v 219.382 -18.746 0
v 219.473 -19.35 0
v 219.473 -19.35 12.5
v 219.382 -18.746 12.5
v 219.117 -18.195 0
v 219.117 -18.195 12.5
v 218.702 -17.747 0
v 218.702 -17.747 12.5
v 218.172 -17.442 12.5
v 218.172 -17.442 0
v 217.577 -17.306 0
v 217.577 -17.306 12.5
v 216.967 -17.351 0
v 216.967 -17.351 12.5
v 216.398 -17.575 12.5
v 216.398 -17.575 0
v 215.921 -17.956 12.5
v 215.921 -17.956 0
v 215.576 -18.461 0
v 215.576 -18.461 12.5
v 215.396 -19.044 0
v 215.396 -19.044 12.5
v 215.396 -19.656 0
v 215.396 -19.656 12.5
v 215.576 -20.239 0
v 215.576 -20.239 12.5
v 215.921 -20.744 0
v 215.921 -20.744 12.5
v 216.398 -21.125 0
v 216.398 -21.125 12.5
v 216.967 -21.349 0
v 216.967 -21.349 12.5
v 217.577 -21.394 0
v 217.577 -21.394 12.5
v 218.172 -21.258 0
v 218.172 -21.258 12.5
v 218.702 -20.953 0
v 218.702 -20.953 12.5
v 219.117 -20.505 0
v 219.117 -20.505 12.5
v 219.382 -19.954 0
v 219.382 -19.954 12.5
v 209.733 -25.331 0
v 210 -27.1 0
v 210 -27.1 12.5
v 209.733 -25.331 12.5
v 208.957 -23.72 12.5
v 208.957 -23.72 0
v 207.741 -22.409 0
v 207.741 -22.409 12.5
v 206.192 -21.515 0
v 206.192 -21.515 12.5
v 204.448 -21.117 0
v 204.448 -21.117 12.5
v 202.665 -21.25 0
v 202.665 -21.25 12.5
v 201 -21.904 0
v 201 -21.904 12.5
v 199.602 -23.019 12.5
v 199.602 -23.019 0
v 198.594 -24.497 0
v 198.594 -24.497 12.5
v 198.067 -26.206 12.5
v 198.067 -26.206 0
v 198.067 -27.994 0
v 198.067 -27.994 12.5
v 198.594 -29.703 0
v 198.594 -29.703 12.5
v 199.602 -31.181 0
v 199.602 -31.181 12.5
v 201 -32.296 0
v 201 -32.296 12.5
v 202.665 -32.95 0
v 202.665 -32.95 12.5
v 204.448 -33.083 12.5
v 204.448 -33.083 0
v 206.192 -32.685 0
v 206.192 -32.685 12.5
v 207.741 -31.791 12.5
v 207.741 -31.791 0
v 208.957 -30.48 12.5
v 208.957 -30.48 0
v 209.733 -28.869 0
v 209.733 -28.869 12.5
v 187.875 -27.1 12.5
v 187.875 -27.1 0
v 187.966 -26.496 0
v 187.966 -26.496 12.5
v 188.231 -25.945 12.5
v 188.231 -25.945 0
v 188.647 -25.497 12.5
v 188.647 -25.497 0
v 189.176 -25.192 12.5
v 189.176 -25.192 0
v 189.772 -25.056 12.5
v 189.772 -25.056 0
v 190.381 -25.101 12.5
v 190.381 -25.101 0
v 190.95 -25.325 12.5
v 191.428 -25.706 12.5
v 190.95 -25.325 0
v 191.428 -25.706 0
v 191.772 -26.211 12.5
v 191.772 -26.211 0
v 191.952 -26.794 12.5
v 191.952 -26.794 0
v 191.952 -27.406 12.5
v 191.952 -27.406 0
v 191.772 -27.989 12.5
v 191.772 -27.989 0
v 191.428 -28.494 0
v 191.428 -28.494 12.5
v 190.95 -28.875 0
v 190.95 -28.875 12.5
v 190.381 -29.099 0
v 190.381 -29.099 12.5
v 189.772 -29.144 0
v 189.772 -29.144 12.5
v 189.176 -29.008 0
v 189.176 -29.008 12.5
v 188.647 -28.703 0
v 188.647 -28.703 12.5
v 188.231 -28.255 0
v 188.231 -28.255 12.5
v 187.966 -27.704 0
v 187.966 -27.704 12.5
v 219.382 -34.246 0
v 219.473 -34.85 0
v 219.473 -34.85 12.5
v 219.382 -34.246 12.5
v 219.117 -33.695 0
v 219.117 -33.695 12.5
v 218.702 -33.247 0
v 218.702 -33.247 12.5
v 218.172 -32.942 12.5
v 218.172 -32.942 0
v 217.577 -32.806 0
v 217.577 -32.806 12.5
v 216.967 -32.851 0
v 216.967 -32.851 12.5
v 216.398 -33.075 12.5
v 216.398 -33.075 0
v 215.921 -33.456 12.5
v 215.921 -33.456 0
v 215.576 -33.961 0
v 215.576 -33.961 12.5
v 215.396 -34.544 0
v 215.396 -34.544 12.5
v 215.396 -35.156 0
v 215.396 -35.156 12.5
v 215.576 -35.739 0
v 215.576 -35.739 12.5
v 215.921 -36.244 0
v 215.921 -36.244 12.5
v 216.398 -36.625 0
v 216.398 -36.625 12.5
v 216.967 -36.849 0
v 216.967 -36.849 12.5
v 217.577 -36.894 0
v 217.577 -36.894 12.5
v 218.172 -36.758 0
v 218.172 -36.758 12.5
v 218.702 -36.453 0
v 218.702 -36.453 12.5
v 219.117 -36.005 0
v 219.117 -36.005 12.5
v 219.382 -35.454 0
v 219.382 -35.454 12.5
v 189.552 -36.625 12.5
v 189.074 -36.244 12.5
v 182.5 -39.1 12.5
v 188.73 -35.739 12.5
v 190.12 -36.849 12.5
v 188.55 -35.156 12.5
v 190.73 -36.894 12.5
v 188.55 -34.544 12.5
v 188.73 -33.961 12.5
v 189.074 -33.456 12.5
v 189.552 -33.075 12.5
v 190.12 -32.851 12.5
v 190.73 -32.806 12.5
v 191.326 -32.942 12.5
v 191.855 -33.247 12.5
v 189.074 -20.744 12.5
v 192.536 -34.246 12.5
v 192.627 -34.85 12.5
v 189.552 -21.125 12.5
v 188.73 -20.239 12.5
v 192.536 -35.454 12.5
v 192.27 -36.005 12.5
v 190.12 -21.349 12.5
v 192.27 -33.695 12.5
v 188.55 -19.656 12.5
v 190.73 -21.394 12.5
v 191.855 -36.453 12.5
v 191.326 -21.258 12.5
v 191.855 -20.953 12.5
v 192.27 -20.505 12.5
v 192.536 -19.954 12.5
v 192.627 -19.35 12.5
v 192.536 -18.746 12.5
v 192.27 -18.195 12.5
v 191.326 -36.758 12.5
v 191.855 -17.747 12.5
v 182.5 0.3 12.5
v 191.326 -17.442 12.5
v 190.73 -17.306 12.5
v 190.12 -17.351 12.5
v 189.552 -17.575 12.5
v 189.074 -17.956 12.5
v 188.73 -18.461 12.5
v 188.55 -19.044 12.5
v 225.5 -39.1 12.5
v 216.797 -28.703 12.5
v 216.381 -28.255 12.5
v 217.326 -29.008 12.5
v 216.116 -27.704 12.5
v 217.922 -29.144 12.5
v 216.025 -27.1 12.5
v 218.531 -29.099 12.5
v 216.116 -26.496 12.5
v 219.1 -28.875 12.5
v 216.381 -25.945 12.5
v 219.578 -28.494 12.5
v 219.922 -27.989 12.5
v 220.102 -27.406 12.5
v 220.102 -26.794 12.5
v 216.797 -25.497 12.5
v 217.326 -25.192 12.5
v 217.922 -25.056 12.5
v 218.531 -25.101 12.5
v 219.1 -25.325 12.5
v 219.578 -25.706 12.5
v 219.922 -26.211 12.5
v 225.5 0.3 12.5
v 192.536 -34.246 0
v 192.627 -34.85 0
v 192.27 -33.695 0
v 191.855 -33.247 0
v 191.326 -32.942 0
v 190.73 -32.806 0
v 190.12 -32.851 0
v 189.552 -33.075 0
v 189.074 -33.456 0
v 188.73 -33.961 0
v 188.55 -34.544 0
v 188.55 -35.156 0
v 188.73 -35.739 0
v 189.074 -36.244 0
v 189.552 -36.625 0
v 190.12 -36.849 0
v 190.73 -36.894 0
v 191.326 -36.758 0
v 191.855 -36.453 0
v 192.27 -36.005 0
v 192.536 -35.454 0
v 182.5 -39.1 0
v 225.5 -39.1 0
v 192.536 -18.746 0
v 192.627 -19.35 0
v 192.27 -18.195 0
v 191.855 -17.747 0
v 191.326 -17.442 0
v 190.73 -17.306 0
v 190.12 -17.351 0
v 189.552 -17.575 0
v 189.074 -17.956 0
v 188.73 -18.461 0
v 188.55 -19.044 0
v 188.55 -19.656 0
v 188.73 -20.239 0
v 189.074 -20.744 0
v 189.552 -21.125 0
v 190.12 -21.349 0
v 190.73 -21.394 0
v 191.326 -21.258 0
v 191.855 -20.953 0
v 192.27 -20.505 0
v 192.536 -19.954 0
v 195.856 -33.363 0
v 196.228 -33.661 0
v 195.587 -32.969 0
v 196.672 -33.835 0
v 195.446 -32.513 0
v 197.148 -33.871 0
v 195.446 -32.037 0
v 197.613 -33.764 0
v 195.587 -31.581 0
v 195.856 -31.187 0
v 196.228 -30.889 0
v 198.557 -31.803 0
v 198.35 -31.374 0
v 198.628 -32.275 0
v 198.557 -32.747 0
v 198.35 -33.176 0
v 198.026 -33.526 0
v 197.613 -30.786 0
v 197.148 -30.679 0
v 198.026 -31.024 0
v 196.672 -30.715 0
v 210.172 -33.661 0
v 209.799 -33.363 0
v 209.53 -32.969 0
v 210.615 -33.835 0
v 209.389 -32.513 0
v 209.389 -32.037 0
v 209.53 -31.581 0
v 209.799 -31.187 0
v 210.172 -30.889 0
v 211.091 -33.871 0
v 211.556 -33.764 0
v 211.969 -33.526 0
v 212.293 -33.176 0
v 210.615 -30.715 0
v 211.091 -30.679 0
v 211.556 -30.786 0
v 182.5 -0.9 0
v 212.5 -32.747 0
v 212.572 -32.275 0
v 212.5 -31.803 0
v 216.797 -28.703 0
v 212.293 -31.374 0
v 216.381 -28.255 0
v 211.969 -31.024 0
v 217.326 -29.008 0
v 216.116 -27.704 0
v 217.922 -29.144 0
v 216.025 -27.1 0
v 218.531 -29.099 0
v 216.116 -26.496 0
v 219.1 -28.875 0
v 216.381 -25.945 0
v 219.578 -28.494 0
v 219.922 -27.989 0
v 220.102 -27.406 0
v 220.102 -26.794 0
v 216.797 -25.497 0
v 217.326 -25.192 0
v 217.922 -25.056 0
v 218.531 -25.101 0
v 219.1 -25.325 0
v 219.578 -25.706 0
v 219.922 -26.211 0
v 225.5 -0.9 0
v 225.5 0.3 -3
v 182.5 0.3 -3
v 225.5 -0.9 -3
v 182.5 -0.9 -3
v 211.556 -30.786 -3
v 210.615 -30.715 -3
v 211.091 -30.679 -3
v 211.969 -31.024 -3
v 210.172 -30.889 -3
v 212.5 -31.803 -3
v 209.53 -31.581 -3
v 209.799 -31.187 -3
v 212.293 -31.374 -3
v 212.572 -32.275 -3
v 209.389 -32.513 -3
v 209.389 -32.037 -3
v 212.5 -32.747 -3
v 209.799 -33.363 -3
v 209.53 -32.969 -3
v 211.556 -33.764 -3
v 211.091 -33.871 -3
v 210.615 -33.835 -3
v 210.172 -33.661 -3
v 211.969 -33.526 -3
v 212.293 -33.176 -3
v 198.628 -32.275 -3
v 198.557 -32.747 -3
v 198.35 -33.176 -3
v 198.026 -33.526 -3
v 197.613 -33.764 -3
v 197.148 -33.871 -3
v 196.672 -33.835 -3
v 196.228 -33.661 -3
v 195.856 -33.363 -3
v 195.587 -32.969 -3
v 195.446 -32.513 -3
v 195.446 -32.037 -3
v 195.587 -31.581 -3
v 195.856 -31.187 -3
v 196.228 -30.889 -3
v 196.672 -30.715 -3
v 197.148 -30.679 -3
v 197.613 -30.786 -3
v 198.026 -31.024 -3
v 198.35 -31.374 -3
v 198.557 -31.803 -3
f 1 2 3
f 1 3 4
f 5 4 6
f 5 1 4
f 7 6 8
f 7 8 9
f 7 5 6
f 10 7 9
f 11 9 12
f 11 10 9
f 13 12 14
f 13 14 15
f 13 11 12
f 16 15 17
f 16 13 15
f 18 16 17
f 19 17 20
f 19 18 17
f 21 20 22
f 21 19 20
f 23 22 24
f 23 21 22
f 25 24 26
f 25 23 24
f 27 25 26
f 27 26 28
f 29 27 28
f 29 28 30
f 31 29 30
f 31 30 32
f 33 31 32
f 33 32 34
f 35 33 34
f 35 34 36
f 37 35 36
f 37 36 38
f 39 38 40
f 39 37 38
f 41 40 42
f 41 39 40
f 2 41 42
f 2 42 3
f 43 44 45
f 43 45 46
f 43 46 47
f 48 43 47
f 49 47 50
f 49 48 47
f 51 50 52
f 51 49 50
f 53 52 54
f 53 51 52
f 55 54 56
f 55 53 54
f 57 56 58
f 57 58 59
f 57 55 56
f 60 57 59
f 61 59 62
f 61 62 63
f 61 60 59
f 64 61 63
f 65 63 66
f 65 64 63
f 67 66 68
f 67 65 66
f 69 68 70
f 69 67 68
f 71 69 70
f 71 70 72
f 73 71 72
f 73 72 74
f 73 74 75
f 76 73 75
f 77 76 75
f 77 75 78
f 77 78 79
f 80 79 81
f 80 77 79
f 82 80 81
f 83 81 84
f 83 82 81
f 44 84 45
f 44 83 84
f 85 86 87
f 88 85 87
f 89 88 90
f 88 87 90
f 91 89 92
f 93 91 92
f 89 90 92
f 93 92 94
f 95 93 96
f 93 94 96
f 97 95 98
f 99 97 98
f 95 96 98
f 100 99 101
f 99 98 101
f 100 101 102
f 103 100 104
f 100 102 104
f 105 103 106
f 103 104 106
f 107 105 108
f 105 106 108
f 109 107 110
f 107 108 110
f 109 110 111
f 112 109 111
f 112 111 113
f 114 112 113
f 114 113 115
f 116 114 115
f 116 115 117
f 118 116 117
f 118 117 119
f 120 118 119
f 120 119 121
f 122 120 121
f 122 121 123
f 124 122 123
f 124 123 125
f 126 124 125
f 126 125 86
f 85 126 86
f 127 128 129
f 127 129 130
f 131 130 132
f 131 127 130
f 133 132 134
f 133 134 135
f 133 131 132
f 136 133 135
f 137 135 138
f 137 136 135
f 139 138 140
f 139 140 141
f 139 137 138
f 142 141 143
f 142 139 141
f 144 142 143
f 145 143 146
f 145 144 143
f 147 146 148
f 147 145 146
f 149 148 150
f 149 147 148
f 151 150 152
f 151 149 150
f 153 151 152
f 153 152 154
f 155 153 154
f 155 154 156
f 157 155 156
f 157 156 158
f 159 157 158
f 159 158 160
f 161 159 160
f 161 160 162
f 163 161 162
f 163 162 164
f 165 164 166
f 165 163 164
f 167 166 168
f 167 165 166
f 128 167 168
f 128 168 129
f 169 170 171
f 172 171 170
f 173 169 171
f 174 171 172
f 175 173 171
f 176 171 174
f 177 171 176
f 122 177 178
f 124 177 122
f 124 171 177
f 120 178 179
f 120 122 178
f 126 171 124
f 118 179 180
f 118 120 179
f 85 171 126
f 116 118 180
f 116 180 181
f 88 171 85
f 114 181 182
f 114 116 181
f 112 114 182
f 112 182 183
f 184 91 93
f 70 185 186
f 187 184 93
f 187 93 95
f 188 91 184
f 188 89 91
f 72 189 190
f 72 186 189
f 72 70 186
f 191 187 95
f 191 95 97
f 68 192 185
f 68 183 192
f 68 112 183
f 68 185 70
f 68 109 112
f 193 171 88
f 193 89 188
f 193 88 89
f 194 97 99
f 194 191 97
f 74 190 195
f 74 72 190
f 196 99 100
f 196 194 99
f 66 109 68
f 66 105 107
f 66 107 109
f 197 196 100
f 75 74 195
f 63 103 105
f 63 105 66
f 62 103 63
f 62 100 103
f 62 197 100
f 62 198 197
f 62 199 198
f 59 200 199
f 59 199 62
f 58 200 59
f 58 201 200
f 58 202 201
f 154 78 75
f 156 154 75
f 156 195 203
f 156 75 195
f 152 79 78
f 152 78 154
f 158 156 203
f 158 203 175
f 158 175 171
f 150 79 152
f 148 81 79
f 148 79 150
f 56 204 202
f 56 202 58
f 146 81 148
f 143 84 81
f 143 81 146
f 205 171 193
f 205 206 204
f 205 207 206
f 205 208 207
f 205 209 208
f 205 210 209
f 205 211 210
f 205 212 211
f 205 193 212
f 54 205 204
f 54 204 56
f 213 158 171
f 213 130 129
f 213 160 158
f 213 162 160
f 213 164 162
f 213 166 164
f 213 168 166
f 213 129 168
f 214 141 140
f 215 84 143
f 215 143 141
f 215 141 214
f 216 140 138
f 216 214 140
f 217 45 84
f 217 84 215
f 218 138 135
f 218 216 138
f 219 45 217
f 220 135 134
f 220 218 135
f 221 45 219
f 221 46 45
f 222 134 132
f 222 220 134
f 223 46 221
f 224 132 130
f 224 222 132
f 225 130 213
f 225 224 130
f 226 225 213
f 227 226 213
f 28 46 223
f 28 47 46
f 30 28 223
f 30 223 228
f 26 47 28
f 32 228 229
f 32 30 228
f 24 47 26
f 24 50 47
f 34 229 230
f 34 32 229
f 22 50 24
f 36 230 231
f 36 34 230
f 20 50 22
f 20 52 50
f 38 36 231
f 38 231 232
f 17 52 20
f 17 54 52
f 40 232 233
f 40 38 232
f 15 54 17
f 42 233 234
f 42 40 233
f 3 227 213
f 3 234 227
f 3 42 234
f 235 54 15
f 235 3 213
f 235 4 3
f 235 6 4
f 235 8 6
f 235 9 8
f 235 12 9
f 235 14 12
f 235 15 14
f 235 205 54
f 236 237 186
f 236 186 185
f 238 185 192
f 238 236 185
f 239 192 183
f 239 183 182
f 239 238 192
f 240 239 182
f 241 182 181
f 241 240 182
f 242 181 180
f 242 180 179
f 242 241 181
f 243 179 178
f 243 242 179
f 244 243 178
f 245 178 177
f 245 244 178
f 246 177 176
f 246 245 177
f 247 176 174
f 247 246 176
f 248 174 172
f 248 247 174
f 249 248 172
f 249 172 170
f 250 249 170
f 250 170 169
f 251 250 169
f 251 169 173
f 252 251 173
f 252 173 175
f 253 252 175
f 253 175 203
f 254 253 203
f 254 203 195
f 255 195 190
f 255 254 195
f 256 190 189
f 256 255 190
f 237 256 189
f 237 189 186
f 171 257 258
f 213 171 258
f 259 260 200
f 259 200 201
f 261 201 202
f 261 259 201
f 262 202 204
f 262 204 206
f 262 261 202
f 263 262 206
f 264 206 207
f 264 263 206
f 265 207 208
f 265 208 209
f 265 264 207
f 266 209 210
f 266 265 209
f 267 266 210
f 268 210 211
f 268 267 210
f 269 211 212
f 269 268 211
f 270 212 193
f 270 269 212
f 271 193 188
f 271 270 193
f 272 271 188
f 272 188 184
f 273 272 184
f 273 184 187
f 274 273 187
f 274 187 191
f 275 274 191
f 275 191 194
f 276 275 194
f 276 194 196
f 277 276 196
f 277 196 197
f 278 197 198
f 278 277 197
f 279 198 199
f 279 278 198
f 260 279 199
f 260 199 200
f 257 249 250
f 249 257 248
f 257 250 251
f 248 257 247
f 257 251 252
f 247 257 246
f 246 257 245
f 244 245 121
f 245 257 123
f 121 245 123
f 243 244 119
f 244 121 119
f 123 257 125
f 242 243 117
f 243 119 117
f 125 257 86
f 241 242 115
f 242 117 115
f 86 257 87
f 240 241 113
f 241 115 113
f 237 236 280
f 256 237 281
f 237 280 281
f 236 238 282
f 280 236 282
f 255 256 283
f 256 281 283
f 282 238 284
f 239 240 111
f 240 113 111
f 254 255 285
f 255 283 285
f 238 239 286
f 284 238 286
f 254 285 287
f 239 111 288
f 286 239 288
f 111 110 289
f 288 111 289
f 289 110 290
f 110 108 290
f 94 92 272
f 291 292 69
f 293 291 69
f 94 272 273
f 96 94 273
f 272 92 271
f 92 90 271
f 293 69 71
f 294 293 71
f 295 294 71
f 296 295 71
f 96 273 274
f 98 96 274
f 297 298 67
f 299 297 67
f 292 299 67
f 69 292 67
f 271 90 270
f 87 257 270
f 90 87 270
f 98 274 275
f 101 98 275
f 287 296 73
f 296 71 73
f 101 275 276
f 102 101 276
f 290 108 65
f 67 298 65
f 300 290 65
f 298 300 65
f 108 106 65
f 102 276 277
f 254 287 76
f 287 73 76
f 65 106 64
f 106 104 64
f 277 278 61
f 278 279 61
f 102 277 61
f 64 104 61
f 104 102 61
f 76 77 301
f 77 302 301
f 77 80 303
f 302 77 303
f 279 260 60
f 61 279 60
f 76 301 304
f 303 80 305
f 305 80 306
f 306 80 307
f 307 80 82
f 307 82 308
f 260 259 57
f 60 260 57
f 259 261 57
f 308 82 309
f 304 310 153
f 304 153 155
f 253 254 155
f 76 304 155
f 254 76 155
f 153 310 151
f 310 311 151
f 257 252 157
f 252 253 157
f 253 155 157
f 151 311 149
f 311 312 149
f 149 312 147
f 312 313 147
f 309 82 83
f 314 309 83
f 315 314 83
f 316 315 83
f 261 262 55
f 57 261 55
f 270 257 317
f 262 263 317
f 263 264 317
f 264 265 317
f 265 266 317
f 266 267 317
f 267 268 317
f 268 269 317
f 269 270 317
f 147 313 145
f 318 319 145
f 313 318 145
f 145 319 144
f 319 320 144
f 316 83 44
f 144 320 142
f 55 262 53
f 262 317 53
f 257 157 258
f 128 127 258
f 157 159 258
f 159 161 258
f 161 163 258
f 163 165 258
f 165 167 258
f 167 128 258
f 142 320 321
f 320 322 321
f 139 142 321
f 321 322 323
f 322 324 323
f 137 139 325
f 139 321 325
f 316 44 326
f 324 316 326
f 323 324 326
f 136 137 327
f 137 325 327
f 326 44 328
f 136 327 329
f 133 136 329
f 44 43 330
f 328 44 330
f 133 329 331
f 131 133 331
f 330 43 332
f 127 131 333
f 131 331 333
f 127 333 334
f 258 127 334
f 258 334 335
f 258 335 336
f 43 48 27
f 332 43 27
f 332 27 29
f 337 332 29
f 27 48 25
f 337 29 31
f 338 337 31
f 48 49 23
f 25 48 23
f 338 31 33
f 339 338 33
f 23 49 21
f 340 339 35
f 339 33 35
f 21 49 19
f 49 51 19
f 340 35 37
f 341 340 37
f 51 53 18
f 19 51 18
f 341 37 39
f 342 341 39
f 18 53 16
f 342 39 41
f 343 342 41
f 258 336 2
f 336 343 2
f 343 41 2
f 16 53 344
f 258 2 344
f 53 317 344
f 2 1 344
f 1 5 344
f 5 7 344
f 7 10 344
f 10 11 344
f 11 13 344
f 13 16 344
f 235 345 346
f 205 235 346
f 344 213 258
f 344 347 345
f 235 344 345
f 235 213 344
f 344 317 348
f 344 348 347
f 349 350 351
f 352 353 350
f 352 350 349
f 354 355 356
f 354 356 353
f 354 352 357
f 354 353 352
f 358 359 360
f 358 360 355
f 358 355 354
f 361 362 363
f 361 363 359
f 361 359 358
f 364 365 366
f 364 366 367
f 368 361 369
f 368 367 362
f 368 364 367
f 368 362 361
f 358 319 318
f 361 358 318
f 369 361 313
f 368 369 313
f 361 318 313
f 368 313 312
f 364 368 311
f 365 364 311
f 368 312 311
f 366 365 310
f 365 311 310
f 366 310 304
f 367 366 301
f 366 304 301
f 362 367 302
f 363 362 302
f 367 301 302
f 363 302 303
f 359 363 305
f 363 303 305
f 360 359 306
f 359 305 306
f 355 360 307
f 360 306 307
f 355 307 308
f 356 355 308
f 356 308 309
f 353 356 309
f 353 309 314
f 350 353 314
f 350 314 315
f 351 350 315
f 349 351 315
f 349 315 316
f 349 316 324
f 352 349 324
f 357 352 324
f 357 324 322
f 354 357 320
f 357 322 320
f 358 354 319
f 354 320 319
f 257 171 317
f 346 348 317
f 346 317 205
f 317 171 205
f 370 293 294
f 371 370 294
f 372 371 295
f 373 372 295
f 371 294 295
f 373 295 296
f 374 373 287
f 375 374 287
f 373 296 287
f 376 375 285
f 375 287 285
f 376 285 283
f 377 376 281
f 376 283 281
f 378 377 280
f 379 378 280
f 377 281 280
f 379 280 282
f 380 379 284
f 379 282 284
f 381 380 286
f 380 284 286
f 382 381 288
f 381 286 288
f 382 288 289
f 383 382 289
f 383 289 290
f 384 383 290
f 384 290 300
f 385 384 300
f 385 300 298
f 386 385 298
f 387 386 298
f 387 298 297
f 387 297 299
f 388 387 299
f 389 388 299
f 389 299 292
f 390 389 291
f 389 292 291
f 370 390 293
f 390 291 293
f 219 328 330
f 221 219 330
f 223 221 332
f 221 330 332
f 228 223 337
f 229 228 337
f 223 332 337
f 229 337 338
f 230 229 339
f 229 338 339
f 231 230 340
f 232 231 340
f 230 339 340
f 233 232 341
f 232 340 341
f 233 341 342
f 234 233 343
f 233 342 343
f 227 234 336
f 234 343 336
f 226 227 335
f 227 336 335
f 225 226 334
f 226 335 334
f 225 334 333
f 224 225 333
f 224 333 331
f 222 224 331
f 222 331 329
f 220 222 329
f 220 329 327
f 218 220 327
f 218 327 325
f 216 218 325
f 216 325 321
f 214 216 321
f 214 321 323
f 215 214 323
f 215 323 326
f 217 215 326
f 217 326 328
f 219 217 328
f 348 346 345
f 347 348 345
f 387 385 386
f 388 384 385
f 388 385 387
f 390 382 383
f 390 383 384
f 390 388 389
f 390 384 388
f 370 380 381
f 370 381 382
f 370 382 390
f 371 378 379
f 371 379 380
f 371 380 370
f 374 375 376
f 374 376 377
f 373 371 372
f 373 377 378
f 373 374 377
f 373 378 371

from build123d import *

# Parameters (mm, degrees)
SKETCH1_W             = 43
SKETCH1_H             = 48.1
SKETCH1_R             = 2.05
SKETCH1_R_2           = 6
BOSS_EXTRUDE1_DEPTH   = 12.5
SKETCH1_3_W           = 43
SKETCH1_3_H           = 10
BOSS_EXTRUDE2_DEPTH   = 3
MOVE_FACE1_BY         = 0.1
CROQUIS1_W            = 43
CROQUIS1_H            = 8.7
CORTAR_EXTRUIR1_DEPTH = 230.388992761
CROQUIS2_R            = 1.6
PINES_PRE_SERIE_DEPTH = 3
CROQUIS3_R            = 2.05
CORTAR_EXTRUIR2_DEPTH = 230.205824533


with BuildPart() as part:
    # Sketch1 → Boss-Extrude1 (new body)
    with BuildSketch(Plane.XY):
        with Locations((204, -15.05)):
            Rectangle(SKETCH1_W, SKETCH1_H)
        with Locations((217.423393759, -19.35)):
            Circle(SKETCH1_R, mode=Mode.SUBTRACT)
        with Locations((190.576606241, -34.85)):
            Circle(SKETCH1_R, mode=Mode.SUBTRACT)
        with Locations((217.423393759, -34.85)):
            Circle(SKETCH1_R, mode=Mode.SUBTRACT)
        with Locations((190.576606241, -19.35)):
            Circle(SKETCH1_R, mode=Mode.SUBTRACT)
        with Locations((204, -27.1)):
            Circle(SKETCH1_R_2, mode=Mode.SUBTRACT)
    extrude(amount=BOSS_EXTRUDE1_DEPTH)

    # Sketch1_3 → Boss-Extrude2 (add)
    with BuildSketch(Plane.XY):
        with Locations((204, 4)):
            Rectangle(SKETCH1_3_W, SKETCH1_3_H)
    extrude(amount=-BOSS_EXTRUDE2_DEPTH)

    # Move Face1: a face moved inward by 0.1
    extrude(part.faces().sort_by_distance((204, -1, -1.5))[0], amount=MOVE_FACE1_BY, dir=(0, 1, 0), mode=Mode.SUBTRACT)

    # Croquis1 → Cortar-Extruir1 (cut, through all)
    with BuildSketch(Plane(origin=(0, 0, -3), x_dir=(-1, 0, 0), z_dir=(0, 0, -1))):
        with Locations((-204, 4.65)):
            Rectangle(CROQUIS1_W, CROQUIS1_H)
    extrude(amount=-CORTAR_EXTRUIR1_DEPTH, mode=Mode.SUBTRACT)

    # Croquis2 → Pines Pre-serie (add)
    with BuildSketch(Plane(origin=(0, 0, 0), x_dir=(-1, 0, 0), z_dir=(0, 0, -1))):
        with Locations(Location((-210.9715045, -32.275, 0), (0, 0, 180))):
            Circle(CROQUIS2_R)
        with Locations(Location((-197.0284955, -32.275, 0), (0, 0, 180))):
            Circle(CROQUIS2_R)
    extrude(amount=PINES_PRE_SERIE_DEPTH)

    # Croquis3 → Cortar-Extruir2 (cut, through all)
    with BuildSketch(Plane(origin=(0, 0, 0), x_dir=(-1, 0, 0), z_dir=(0, 0, -1))):
        with Locations((-218.075, -27.1)):
            Circle(CROQUIS3_R)
        with Locations((-189.925, -27.1)):
            Circle(CROQUIS3_R)
    extrude(amount=-CORTAR_EXTRUIR2_DEPTH, mode=Mode.SUBTRACT)


solid = part.part
